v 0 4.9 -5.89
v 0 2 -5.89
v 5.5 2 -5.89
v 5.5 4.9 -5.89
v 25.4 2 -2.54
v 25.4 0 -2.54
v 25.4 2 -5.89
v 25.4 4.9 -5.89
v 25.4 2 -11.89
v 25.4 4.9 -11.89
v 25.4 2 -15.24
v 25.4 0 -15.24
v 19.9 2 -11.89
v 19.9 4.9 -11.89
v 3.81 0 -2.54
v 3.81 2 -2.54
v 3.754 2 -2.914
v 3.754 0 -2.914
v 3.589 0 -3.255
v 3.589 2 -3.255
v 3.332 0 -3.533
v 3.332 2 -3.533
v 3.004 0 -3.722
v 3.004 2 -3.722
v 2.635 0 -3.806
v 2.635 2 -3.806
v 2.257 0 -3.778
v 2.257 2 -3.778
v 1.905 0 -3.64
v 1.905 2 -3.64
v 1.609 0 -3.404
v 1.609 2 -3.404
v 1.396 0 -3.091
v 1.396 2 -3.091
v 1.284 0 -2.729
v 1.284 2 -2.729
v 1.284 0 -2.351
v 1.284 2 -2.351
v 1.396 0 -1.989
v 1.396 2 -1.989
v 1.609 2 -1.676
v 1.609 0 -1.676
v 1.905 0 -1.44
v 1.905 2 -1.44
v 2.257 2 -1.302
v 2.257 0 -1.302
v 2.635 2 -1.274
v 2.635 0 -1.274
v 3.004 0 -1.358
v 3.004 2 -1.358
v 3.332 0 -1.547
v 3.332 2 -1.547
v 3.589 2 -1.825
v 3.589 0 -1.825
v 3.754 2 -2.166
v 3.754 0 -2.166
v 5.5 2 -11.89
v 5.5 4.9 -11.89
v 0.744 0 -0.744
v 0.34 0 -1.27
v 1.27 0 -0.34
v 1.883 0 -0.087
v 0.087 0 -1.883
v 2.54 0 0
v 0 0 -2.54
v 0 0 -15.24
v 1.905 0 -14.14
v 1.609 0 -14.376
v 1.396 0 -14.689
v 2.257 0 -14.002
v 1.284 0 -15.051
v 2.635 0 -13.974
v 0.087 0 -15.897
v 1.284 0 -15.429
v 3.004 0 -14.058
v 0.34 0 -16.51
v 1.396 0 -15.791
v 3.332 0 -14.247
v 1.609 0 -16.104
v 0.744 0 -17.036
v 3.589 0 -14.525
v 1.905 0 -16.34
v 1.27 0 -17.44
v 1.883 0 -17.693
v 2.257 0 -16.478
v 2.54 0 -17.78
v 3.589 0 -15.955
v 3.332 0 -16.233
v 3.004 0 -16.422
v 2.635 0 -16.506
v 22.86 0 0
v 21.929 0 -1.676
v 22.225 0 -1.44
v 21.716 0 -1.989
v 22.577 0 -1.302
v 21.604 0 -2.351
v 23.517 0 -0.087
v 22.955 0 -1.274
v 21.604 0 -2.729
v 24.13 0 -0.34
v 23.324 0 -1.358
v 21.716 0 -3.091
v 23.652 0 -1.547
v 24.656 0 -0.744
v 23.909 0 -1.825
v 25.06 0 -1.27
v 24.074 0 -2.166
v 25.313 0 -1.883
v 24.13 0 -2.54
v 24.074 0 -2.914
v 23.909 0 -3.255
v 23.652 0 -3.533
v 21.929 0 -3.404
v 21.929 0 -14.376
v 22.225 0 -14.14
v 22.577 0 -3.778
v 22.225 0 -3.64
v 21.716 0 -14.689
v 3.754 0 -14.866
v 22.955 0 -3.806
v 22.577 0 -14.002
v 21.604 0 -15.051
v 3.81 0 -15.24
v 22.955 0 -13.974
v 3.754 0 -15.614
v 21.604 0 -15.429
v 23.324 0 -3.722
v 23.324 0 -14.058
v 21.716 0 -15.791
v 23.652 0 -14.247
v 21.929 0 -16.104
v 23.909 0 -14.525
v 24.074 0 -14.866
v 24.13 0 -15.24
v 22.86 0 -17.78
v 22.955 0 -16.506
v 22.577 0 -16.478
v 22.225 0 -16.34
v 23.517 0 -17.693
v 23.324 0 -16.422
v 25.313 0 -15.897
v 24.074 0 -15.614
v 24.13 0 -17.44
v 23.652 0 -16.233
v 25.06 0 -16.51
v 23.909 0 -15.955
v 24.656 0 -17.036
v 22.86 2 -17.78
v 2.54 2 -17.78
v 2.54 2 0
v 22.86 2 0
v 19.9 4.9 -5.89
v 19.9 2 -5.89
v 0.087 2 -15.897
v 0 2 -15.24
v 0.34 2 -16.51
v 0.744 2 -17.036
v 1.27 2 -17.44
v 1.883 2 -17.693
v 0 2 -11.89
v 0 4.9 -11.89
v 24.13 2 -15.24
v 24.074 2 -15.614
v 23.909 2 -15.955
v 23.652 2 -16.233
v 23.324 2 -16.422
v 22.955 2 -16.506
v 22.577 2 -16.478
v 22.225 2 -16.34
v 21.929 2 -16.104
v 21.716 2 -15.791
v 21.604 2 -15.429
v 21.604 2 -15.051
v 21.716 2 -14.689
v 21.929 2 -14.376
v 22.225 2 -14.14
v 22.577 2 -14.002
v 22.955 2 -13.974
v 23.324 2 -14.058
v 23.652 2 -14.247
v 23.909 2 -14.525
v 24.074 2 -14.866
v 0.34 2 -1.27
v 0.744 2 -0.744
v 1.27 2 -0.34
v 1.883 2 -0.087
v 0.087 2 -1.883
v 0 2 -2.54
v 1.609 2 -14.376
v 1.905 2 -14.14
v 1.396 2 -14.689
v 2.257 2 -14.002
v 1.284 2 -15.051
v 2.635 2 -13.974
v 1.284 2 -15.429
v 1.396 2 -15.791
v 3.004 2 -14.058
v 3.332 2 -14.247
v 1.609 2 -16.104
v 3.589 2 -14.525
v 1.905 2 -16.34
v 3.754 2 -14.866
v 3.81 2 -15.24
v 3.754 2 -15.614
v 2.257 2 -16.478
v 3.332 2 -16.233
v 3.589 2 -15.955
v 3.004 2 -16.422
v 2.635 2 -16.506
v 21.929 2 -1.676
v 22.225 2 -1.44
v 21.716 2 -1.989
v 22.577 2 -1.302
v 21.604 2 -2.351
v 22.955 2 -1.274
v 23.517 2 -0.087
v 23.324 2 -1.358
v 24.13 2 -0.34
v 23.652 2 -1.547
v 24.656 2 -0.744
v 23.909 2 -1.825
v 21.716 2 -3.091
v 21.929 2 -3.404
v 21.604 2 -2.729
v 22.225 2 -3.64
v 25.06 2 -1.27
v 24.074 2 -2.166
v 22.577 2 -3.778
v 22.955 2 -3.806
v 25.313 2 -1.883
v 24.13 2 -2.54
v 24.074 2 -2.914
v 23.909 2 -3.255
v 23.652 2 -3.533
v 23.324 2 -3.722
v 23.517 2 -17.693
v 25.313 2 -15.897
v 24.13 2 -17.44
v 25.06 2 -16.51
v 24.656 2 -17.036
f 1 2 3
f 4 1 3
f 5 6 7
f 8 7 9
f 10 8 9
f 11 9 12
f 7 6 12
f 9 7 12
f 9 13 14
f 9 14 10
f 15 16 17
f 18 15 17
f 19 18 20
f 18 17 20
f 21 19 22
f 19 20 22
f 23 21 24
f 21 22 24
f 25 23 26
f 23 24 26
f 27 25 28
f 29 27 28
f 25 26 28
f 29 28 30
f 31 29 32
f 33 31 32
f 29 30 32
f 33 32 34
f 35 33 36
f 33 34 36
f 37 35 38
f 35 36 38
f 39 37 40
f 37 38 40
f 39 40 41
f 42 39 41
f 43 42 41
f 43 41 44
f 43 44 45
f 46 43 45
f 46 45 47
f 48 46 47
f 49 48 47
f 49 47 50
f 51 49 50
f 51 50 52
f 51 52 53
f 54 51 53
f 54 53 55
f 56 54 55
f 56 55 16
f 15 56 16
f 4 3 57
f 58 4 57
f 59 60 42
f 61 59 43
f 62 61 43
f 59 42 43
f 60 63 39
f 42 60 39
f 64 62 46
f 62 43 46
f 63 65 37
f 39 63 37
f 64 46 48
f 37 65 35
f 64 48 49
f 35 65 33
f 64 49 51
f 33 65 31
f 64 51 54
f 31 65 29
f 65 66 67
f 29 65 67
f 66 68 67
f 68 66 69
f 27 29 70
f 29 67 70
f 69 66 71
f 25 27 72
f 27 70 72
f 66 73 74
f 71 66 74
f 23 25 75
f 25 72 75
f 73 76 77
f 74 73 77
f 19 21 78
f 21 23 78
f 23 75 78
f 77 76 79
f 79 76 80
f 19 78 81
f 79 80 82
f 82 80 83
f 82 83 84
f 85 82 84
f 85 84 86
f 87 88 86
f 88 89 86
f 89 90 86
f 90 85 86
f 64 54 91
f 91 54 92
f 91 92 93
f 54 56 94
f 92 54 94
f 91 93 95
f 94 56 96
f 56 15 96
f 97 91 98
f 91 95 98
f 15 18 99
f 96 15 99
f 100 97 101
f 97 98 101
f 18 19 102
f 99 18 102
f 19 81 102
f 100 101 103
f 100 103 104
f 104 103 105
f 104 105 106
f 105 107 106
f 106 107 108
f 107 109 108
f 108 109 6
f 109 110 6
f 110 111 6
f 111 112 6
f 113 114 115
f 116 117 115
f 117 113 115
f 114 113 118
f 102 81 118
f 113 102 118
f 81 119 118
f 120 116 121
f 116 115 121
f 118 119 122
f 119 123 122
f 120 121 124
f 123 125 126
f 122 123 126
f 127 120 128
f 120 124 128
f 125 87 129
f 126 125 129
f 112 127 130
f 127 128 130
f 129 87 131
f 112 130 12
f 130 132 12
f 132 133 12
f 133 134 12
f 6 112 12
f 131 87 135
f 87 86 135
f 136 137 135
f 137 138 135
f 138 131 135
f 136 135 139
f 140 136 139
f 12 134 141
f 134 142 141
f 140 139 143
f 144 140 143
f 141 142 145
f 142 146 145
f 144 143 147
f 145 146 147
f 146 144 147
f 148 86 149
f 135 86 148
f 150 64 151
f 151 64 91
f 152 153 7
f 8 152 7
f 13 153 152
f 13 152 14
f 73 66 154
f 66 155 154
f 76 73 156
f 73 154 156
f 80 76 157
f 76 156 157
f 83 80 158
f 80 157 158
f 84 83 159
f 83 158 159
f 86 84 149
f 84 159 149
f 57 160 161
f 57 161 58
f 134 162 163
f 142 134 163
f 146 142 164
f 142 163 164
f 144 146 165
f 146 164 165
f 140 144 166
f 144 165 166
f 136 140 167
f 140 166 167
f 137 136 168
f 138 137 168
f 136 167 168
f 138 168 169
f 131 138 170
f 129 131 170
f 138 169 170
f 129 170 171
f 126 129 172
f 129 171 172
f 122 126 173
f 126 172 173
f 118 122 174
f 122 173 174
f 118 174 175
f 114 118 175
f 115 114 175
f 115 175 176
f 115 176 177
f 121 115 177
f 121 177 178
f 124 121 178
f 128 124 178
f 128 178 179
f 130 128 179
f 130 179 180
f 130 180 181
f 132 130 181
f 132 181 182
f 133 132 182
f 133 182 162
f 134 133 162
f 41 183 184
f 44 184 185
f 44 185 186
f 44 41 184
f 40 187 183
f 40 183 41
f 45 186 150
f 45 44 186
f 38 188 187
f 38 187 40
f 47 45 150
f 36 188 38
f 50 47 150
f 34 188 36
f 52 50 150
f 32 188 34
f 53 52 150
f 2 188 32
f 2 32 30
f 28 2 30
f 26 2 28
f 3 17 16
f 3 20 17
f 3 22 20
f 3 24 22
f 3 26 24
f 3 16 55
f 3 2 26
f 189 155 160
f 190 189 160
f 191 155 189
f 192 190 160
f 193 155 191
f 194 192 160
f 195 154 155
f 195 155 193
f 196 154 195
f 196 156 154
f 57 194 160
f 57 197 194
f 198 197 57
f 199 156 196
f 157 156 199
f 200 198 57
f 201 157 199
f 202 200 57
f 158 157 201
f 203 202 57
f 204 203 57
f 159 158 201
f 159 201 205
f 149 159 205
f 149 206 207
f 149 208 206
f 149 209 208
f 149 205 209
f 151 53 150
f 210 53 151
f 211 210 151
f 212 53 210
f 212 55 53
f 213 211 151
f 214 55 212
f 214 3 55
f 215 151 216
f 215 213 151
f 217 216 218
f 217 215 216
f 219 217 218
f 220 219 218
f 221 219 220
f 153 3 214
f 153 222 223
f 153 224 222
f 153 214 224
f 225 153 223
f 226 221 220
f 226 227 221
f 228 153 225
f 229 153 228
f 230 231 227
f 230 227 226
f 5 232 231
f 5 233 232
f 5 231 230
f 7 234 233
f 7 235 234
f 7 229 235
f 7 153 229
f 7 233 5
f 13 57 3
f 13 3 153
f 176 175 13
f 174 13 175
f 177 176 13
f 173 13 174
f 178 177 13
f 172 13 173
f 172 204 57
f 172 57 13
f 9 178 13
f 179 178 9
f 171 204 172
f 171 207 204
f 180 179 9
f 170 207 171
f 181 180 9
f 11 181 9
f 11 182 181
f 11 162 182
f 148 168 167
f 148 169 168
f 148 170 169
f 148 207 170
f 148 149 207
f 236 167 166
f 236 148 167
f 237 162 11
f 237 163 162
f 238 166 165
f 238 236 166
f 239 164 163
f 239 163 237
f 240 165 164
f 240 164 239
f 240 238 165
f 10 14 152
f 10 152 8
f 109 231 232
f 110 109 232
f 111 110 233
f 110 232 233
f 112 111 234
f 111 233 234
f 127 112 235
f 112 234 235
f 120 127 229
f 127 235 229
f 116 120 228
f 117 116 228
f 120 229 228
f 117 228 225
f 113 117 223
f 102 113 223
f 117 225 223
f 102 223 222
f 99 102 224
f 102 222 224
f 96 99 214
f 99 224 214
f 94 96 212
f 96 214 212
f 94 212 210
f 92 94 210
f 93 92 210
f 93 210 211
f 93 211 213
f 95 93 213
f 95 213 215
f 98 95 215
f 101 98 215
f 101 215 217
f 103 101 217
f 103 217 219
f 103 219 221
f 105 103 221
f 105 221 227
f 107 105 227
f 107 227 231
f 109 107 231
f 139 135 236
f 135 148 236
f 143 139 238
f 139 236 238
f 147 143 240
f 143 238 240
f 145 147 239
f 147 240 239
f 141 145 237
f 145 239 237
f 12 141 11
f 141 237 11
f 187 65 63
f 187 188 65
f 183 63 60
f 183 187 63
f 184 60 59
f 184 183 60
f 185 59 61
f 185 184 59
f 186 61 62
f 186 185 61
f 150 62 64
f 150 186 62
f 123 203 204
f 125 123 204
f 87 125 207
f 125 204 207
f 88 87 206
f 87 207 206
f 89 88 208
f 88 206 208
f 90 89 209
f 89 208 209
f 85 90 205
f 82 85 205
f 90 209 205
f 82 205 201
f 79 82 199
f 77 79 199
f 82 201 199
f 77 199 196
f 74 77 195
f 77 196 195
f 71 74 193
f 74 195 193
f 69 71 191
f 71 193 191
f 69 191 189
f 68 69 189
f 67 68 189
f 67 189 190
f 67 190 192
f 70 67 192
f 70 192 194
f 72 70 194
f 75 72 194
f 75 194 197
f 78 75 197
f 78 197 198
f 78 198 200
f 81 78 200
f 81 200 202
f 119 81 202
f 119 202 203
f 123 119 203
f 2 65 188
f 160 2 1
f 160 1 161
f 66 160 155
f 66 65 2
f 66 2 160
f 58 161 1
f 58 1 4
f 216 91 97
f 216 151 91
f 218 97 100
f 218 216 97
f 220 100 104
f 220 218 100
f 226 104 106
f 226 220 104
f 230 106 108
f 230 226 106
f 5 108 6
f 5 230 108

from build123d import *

# Parameters (mm, degrees)
SKETCH1_W           = 25.4
SKETCH1_H           = 17.78
BOSS_EXTRUDE1_DEPTH = 2
SKETCH2_R           = 1.27
CUT_EXTRUDE1_DEPTH  = 3
SKETCH3_W           = 5.5
SKETCH3_H           = 6
BOSS_EXTRUDE2_DEPTH = 2.9
FILLET1_R           = 2.54


with BuildPart() as part:
    # Sketch1 → Boss-Extrude1 (new body)
    with BuildSketch(Plane(origin=(0, 0, 0), x_dir=(1, 0, 0), z_dir=(0, 1, 0))):
        with Locations((12.7, 8.89)):
            Rectangle(SKETCH1_W, SKETCH1_H)
    extrude(amount=BOSS_EXTRUDE1_DEPTH)

    # Sketch2 → Cut-Extrude1 (cut, through all)
    with BuildSketch(Plane(origin=(0, 2, 0), x_dir=(1, 0, 0), z_dir=(0, 1, 0))):
        with Locations((2.54, 15.24)):
            Circle(SKETCH2_R)
        with Locations((22.86, 15.24)):
            Circle(SKETCH2_R)
        with Locations((22.86, 2.54)):
            Circle(SKETCH2_R)
        with Locations((2.54, 2.54)):
            Circle(SKETCH2_R)
    extrude(amount=-CUT_EXTRUDE1_DEPTH, mode=Mode.SUBTRACT)

    # Sketch3 → Boss-Extrude2 (add)
    with BuildSketch(Plane(origin=(0, 2, 0), x_dir=(1, 0, 0), z_dir=(0, 1, 0))):
        with Locations((22.65, 8.89)):
            Rectangle(SKETCH3_W, SKETCH3_H)
        with Locations((2.75, 8.89)):
            Rectangle(SKETCH3_W, SKETCH3_H)
    extrude(amount=BOSS_EXTRUDE2_DEPTH)

    # Fillet1
    fillet1_edges = [part.edges().sort_by_distance(p)[0] for p in [
        (0, 1, -17.78),
        (25.4, 1, -17.78),
        (25.4, 1, 0),
        (0, 1, 0),
    ]]
    fillet(fillet1_edges, radius=FILLET1_R)


solid = part.part
